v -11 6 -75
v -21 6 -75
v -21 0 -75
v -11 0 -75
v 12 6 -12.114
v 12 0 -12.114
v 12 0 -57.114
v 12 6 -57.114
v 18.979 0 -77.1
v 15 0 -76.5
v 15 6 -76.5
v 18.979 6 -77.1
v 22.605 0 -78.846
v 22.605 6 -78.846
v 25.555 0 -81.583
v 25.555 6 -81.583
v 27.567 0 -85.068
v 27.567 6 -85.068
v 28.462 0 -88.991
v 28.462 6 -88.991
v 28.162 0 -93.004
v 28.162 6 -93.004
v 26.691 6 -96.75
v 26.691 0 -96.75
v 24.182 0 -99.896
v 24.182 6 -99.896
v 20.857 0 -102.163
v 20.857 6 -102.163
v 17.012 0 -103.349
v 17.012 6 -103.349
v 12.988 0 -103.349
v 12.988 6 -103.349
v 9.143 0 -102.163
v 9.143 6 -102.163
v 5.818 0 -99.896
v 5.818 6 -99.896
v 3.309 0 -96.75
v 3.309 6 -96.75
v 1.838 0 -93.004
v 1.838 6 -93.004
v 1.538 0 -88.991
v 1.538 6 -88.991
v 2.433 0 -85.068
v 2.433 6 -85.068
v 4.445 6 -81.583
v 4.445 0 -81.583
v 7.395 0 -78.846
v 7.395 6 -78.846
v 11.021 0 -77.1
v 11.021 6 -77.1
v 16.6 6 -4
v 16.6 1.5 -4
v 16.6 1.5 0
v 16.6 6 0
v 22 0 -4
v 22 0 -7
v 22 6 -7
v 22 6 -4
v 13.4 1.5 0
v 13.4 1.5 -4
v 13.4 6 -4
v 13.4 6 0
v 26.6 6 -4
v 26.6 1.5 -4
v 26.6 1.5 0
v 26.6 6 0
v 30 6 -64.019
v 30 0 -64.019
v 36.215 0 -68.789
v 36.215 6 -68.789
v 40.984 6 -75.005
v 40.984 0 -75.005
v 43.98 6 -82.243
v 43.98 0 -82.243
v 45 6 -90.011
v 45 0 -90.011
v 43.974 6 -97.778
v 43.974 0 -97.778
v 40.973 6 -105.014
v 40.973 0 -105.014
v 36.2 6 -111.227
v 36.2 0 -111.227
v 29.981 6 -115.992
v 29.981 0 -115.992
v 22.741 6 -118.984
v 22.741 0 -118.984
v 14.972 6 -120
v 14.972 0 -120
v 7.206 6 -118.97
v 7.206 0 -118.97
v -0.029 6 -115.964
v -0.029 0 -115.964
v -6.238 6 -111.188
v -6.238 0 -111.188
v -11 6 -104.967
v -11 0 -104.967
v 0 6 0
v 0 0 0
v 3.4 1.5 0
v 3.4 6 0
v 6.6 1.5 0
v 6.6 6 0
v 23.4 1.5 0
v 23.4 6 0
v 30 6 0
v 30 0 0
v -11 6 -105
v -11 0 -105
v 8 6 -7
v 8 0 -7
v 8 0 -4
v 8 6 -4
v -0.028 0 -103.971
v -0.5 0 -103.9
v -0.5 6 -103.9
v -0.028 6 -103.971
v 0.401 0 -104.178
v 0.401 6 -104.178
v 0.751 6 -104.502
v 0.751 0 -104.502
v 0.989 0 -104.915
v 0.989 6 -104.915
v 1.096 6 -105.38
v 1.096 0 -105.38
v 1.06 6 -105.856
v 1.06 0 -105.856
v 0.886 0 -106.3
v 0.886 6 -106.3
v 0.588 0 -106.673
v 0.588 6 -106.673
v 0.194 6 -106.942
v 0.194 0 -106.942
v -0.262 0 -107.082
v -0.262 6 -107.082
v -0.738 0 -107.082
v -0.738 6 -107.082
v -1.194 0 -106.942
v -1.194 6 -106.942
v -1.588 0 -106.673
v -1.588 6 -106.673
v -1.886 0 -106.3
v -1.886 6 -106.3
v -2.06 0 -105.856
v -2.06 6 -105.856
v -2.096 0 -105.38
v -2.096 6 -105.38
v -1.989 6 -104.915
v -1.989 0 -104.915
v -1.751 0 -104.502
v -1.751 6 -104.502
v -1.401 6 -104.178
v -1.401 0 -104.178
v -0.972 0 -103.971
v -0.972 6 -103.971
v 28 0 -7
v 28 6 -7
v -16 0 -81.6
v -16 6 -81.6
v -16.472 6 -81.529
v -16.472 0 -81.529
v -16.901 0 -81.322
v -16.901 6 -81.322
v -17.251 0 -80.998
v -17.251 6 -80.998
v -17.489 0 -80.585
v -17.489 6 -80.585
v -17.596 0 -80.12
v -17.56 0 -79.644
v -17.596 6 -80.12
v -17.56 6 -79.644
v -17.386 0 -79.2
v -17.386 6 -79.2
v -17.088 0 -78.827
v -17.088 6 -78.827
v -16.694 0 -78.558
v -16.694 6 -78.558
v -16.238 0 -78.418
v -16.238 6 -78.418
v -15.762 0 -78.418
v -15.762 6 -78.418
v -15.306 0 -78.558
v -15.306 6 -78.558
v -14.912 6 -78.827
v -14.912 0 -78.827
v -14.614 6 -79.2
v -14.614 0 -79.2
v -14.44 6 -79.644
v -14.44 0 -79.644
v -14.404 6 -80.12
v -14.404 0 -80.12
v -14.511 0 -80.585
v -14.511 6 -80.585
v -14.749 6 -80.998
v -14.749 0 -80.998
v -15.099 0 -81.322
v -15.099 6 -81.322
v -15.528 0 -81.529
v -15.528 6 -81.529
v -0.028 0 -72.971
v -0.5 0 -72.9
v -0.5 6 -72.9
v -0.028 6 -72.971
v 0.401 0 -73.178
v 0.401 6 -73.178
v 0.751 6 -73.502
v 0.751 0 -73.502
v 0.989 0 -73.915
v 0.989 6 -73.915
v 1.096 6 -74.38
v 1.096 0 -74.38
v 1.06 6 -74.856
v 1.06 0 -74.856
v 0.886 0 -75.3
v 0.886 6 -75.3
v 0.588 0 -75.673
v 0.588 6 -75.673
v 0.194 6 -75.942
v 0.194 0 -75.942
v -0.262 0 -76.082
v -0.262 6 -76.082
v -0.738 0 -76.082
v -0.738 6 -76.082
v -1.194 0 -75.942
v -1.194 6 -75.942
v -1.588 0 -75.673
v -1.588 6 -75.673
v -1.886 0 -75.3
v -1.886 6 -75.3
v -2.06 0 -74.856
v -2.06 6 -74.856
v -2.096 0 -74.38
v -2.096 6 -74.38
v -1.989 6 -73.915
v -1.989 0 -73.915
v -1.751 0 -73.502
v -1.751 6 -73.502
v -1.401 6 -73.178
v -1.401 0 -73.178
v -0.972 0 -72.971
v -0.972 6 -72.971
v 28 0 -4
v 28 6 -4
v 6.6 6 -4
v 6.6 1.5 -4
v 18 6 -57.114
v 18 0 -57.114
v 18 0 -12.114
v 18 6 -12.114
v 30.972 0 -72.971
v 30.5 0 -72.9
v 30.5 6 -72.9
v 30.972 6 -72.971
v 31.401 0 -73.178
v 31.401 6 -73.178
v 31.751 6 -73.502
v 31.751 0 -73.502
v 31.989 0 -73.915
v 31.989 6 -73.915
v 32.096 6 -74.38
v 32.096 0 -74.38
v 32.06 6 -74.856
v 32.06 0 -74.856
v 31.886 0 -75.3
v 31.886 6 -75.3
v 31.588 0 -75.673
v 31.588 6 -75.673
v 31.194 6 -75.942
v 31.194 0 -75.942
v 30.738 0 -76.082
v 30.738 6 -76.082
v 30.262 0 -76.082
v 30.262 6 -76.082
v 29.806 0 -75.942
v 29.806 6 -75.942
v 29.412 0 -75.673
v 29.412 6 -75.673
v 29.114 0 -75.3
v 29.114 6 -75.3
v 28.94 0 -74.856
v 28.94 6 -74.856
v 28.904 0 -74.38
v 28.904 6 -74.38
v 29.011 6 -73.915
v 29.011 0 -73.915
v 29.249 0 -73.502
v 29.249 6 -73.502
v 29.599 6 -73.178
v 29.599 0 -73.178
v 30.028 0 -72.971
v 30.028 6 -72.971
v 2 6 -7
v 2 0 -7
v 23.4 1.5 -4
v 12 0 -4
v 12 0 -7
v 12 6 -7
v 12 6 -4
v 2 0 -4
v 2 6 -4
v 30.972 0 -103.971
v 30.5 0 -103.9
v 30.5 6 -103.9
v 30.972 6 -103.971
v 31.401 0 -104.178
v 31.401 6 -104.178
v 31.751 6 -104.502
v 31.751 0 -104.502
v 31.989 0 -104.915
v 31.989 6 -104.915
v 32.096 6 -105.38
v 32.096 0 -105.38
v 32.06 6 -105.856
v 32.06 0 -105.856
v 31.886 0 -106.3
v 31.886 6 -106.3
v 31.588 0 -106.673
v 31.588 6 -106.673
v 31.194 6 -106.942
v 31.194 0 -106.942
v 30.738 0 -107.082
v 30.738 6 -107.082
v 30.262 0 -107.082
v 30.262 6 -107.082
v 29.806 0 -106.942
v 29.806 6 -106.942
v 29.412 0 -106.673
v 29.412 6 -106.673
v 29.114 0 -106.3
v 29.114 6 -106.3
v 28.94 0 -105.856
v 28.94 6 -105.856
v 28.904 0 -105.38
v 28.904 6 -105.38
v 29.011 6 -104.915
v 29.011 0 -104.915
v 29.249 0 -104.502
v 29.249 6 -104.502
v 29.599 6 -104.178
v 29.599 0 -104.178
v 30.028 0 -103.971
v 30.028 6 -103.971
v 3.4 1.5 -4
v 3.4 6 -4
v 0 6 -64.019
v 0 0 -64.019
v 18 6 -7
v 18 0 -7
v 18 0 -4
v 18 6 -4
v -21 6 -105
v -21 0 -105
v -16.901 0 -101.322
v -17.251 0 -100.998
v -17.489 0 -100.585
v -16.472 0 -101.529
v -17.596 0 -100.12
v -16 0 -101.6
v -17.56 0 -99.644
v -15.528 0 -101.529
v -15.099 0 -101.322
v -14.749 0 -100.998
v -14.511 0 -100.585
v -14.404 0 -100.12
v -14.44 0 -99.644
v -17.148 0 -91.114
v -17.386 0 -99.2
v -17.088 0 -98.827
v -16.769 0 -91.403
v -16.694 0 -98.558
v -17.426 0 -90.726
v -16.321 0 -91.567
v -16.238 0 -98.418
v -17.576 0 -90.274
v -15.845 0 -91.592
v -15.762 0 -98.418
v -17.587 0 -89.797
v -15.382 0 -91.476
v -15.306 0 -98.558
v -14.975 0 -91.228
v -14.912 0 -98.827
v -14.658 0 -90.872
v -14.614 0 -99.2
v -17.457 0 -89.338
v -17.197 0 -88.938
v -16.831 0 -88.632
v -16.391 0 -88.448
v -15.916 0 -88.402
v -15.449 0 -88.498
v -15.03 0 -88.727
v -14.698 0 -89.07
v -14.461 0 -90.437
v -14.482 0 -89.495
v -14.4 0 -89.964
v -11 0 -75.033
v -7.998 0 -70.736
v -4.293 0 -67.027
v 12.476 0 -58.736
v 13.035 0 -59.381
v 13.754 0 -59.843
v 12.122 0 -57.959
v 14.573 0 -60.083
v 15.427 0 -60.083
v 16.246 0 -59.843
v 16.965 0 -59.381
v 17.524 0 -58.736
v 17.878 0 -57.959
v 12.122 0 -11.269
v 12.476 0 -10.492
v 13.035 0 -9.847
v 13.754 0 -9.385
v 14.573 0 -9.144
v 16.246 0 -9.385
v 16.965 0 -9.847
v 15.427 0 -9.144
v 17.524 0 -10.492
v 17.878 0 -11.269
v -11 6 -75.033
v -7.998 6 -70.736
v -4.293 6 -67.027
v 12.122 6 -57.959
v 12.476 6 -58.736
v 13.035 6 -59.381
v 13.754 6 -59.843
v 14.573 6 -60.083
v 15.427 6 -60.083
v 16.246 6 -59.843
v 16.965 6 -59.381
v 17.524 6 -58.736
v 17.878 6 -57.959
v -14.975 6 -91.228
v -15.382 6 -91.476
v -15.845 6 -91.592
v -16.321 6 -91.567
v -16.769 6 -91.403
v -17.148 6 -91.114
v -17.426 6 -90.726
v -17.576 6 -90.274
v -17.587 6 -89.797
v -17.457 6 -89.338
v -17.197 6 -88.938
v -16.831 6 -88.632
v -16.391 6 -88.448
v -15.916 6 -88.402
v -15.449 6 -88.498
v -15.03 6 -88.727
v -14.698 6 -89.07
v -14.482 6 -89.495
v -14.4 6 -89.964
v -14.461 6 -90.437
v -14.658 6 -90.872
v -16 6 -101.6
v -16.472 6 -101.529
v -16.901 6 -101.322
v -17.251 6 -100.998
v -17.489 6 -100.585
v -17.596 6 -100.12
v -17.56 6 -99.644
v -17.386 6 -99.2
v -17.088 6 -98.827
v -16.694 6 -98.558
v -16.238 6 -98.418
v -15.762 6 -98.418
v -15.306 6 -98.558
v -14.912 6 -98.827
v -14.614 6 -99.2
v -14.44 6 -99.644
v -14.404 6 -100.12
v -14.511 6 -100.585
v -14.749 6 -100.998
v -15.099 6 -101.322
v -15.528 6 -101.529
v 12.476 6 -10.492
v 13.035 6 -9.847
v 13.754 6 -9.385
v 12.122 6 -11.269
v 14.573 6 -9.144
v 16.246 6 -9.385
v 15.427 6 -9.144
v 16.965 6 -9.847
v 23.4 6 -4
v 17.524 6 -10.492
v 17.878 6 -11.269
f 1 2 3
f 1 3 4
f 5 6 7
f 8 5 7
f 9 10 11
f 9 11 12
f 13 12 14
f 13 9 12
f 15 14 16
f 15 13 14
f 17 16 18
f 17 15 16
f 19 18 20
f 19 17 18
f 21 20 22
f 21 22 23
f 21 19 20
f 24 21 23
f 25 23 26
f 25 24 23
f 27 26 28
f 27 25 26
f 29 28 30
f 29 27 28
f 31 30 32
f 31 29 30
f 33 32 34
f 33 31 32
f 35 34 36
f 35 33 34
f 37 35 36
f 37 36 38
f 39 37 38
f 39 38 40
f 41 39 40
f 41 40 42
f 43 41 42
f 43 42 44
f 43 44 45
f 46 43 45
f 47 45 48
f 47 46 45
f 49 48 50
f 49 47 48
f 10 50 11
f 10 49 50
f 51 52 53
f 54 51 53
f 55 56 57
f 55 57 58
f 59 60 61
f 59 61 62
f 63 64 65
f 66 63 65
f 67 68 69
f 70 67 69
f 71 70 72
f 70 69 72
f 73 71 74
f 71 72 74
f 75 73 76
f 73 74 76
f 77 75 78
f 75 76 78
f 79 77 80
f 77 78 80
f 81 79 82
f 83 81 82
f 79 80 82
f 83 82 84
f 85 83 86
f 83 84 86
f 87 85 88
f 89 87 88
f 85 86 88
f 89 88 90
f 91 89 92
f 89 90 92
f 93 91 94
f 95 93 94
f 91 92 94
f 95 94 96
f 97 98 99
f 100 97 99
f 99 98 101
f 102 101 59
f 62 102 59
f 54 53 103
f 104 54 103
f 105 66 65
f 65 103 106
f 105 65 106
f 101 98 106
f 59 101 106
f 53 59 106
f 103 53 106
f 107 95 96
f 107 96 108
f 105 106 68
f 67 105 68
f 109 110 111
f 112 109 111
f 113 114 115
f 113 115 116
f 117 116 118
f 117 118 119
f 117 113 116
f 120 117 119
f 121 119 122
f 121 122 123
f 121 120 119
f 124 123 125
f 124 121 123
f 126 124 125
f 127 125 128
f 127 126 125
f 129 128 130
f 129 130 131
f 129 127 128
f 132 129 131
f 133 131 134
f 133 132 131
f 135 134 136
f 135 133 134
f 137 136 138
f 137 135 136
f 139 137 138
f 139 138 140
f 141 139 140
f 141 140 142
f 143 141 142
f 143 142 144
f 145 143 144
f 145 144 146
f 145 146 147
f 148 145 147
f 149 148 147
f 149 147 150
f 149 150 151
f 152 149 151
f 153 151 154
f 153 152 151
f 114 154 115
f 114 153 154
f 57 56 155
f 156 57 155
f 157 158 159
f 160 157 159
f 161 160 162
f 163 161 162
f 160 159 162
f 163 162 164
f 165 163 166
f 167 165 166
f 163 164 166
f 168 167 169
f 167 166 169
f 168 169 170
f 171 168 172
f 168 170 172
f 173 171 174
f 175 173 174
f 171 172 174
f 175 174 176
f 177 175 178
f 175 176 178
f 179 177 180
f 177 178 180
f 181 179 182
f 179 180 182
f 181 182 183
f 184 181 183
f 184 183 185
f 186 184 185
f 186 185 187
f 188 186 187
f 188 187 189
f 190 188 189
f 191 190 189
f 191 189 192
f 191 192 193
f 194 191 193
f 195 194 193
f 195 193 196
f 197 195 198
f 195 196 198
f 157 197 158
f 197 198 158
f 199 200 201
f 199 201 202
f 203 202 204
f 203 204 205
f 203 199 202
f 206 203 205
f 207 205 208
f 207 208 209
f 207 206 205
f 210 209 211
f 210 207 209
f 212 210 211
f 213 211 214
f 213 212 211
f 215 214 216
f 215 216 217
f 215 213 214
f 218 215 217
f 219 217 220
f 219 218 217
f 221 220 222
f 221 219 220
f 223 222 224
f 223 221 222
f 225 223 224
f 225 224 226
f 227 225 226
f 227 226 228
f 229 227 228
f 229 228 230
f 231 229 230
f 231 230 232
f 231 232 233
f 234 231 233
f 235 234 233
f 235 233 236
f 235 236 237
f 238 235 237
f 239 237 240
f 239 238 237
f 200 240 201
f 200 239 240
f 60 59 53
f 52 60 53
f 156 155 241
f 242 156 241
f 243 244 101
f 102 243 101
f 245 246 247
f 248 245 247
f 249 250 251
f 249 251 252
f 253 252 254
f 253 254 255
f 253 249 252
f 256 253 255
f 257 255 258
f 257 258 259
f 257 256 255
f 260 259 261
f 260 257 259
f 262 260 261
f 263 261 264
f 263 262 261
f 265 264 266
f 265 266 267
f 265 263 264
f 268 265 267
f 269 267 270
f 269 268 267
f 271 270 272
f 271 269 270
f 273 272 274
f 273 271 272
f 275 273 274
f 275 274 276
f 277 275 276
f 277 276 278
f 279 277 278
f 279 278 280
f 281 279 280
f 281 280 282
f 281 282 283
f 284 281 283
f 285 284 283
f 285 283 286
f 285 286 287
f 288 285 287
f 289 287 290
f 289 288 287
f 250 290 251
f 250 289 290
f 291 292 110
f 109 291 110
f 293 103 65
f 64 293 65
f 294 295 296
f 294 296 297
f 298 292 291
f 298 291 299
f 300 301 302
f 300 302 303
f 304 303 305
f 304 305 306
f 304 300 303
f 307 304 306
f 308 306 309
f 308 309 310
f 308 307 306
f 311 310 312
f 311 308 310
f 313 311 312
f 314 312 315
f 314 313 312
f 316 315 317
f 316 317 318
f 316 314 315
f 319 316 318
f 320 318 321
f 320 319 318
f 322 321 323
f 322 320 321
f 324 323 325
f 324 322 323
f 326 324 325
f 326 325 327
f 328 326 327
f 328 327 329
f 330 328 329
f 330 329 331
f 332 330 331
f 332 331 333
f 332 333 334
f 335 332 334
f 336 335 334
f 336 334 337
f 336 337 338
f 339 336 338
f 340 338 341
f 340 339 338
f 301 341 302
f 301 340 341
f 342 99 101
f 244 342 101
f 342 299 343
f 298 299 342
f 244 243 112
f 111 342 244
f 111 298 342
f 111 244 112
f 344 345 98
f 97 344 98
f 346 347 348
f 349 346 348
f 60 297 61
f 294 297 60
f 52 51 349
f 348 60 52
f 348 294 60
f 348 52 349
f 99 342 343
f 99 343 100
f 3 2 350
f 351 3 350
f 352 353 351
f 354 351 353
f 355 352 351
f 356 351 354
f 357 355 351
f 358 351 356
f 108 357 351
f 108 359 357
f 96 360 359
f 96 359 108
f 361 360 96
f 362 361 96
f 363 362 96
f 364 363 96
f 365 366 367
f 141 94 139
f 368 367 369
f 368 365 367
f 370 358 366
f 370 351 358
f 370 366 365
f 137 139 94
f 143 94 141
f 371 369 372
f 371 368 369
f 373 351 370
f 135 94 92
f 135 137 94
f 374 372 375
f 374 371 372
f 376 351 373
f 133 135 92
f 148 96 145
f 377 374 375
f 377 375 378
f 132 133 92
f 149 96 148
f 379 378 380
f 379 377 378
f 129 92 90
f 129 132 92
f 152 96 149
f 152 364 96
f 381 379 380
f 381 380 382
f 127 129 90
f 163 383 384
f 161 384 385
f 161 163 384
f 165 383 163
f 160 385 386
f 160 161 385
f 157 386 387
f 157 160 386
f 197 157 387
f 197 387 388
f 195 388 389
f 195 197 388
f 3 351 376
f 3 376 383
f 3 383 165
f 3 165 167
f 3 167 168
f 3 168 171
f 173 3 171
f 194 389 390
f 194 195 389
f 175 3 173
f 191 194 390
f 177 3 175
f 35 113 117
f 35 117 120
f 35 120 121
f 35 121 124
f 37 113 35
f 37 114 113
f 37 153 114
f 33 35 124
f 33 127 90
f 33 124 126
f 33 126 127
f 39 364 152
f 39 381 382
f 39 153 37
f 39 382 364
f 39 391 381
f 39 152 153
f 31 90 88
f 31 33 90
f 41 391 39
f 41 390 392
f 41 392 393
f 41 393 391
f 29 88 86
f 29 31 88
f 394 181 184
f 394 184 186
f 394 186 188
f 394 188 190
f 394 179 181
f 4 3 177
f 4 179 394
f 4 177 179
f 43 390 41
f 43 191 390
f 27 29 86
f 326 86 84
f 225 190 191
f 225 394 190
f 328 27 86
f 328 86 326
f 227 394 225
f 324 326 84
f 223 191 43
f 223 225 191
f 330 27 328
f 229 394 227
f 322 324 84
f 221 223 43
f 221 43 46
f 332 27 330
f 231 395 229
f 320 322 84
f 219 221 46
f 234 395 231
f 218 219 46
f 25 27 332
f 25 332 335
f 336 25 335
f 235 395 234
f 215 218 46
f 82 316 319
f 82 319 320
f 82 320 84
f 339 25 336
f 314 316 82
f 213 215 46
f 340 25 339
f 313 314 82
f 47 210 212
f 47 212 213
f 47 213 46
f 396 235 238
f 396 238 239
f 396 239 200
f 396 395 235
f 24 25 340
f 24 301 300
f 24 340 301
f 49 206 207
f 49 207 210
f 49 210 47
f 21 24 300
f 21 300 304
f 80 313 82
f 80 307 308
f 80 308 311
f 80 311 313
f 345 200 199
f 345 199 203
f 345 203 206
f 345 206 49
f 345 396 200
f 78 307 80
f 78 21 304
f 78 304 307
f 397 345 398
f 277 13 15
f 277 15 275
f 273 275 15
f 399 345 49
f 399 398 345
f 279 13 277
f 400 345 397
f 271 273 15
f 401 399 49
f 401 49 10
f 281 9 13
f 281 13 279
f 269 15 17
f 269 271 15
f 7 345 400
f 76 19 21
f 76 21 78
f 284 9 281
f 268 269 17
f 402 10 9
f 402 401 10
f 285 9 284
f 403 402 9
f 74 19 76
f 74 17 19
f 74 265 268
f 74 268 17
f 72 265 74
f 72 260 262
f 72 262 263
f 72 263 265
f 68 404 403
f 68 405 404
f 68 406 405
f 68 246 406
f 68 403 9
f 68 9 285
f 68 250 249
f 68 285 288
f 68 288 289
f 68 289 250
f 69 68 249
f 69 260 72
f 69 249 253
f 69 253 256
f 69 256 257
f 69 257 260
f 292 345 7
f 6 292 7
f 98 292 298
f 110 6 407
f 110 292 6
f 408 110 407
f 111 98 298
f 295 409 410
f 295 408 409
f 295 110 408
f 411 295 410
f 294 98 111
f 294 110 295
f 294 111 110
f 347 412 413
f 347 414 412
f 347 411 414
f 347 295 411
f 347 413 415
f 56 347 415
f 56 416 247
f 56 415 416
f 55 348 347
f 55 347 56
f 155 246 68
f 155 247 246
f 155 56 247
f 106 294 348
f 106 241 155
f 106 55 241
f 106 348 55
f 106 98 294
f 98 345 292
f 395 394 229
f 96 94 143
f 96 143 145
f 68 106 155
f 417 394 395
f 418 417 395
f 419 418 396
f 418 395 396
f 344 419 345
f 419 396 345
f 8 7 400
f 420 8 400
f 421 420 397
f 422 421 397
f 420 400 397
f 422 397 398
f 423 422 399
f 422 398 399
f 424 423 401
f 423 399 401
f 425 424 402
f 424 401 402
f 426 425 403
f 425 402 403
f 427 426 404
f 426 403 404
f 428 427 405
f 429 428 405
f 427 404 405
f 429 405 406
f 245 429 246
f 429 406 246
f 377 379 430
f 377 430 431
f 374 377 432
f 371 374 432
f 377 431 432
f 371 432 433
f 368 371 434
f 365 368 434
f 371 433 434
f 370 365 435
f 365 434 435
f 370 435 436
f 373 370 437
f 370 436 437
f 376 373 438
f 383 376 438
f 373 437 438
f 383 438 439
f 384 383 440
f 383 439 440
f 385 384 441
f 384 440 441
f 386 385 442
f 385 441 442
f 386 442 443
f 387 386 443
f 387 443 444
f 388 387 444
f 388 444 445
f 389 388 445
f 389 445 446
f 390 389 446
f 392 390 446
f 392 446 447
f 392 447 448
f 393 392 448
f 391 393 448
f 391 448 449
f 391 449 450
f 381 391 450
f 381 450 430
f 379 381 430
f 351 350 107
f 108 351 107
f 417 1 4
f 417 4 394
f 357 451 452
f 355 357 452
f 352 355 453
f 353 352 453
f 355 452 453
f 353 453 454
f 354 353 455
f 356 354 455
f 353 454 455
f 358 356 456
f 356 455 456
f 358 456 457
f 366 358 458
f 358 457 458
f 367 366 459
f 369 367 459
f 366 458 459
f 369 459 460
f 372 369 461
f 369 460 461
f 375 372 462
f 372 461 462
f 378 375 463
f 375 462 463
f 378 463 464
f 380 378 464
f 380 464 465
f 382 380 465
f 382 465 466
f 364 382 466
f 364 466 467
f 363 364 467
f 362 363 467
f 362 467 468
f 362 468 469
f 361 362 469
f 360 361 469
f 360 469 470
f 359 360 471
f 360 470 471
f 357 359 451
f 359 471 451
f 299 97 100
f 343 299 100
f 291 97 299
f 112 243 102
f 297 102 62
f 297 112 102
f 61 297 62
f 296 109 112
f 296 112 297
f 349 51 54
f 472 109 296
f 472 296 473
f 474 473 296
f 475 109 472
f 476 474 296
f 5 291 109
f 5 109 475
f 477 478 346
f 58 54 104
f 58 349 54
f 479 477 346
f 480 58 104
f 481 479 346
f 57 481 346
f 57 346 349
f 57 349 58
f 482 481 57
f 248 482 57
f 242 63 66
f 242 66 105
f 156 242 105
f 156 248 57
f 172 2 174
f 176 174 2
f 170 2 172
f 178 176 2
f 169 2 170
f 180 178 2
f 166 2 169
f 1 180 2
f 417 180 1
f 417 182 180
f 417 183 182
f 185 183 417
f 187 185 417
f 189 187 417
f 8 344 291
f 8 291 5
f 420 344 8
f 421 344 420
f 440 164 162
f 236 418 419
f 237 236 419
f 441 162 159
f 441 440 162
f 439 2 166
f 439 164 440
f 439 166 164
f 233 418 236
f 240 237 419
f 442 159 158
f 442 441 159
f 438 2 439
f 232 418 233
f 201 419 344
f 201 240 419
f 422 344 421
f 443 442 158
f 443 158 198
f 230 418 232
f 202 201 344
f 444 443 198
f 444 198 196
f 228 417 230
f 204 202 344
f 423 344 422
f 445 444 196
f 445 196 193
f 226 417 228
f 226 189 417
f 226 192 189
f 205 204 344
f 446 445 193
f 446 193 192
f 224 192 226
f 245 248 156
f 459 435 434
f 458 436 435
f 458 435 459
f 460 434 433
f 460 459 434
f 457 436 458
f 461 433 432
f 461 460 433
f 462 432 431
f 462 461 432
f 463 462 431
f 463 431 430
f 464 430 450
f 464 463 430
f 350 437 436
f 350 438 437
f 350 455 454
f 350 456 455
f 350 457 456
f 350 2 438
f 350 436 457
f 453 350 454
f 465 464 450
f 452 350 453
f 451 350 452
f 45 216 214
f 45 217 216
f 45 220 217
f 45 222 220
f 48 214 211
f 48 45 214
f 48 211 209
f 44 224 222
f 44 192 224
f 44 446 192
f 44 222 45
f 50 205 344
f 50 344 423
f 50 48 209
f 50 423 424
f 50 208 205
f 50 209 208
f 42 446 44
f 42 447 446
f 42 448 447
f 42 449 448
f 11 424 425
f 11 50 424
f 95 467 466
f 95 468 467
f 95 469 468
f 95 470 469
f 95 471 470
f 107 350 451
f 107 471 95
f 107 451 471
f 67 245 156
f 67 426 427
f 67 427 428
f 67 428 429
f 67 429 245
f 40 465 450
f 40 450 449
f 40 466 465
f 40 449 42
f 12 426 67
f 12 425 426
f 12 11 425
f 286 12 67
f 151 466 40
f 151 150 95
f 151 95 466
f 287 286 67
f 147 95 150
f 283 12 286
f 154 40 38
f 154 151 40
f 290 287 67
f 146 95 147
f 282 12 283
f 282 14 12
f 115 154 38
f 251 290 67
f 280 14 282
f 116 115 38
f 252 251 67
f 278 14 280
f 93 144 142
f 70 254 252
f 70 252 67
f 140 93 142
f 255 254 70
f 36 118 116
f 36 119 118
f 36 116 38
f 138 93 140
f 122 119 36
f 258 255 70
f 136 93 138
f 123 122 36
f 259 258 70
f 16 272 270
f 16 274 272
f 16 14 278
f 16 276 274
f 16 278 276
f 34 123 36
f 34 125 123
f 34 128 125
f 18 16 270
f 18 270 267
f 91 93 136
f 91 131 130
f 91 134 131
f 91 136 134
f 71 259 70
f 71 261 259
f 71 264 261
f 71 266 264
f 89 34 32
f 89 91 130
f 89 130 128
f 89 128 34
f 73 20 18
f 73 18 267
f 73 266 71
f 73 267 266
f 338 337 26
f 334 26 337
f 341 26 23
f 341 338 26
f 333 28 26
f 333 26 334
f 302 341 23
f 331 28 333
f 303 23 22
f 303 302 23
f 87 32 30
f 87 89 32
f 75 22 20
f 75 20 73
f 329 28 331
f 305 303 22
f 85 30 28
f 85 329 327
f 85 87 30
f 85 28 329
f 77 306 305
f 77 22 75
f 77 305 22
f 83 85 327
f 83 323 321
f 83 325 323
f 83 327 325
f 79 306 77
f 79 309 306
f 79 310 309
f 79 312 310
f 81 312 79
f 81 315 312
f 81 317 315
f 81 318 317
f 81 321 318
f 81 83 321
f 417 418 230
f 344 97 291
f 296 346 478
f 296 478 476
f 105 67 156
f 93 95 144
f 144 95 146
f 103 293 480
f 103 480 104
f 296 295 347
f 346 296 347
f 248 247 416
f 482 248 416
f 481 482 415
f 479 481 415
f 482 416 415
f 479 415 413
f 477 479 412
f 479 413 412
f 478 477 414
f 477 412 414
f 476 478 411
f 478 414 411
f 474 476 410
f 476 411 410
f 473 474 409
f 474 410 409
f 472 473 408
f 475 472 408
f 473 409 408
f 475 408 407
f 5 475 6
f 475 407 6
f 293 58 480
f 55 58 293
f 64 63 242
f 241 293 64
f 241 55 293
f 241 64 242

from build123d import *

# Parameters (mm, degrees)
SKETCH_1_R          = 1.6
SKETCH_1_R_2        = 13.5
EXTRUDE_1_DEPTH     = 6
SKETCH_3_W          = 10
SKETCH_3_H          = 30
SKETCH_3_R          = 1.6
EXTRUDE_2_DEPTH     = 6
SKETCH_7_W          = 3.2
SKETCH_7_H          = 4
CUT_EXTRUDE_3_DEPTH = 14.5
SKETCH_8_W          = 6
SKETCH_8_H          = 3
CUT_EXTRUDE_4_DEPTH = 14.5
SKETCH_10_W         = 23.31764578
SKETCH_10_H         = 4
EXTRUDE_3_DEPTH     = 1.5
SKETCH_11_R         = 1.6
CUT_EXTRUDE_5_DEPTH = 10


with BuildPart() as part:
    # 草图1 → 凸台-拉伸1 (new body)
    with BuildSketch(Plane(origin=(0, 0, 0), x_dir=(1, 0, 0), z_dir=(0, 1, 0))):
        with BuildLine():
            Line((0, 64.019237886), (0, 0))
            Line((0, 0), (30, 0))
            Line((30, 0), (30, 64.019237886))
            ThreePointArc((30, 64.019237886), (15, 120), (0, 64.019237886))
        make_face()
        with BuildLine():
            ThreePointArc((12, 57.113903717), (15, 60.113903717), (18, 57.113903717))
            Line((18, 57.113903717), (18, 12.113903717))
            ThreePointArc((18, 12.113903717), (15, 9.113903717), (12, 12.113903717))
            Line((12, 12.113903717), (12, 57.113903717))
        make_face(mode=Mode.SUBTRACT)
        with Locations(Location((-0.5, 74.5, 0), (0, 0, 270))):
            Circle(SKETCH_1_R, mode=Mode.SUBTRACT)
        with Locations(Location((15, 90, 0), (0, 0, 270))):
            Circle(SKETCH_1_R_2, mode=Mode.SUBTRACT)
        with Locations(Location((30.5, 74.5, 0), (0, 0, 270))):
            Circle(SKETCH_1_R, mode=Mode.SUBTRACT)
        with Locations(Location((30.5, 105.5, 0), (0, 0, 270))):
            Circle(SKETCH_1_R, mode=Mode.SUBTRACT)
        with Locations(Location((-0.5, 105.5, 0), (0, 0, 270))):
            Circle(SKETCH_1_R, mode=Mode.SUBTRACT)
    extrude(amount=EXTRUDE_1_DEPTH)

    # 草图3 → 凸台-拉伸2 (add)
    with BuildSketch(Plane(origin=(0, 6, 0), x_dir=(1, 0, 0), z_dir=(0, 1, 0))):
        with Locations((-16, 90)):
            Rectangle(SKETCH_3_W, SKETCH_3_H)
        with Locations(Location((-16, 80, 0), (0, 0, 90))):
            Circle(SKETCH_3_R, mode=Mode.SUBTRACT)
        with Locations((-16, 90)):
            Circle(SKETCH_3_R, mode=Mode.SUBTRACT)
        with Locations(Location((-16, 100, 0), (0, 0, 90))):
            Circle(SKETCH_3_R, mode=Mode.SUBTRACT)
    extrude(amount=-EXTRUDE_2_DEPTH)

    # 草图7 → 切除-拉伸3 (cut)
    with BuildSketch(Plane.XZ):
        with Locations((25, -2)):
            Rectangle(SKETCH_7_W, SKETCH_7_H)
        with Locations((15, -2)):
            Rectangle(SKETCH_7_W, SKETCH_7_H)
        with Locations((5, -2)):
            Rectangle(SKETCH_7_W, SKETCH_7_H)
    extrude(amount=-CUT_EXTRUDE_3_DEPTH, mode=Mode.SUBTRACT)

    # 草图8 → 切除-拉伸4 (cut)
    with BuildSketch(Plane.XZ):
        with Locations((5, -5.5)):
            Rectangle(SKETCH_8_W, SKETCH_8_H)
        with Locations((15, -5.5)):
            Rectangle(SKETCH_8_W, SKETCH_8_H)
        with Locations((25, -5.5)):
            Rectangle(SKETCH_8_W, SKETCH_8_H)
    extrude(amount=-CUT_EXTRUDE_4_DEPTH, mode=Mode.SUBTRACT)

    # 草图10 → 凸台-拉伸3 (add)
    with BuildSketch(Plane.XZ):
        with Locations((15.05882289, -2)):
            Rectangle(SKETCH_10_W, SKETCH_10_H)
    extrude(amount=-EXTRUDE_3_DEPTH)

    # 草图11 → 切除-拉伸5 (cut)
    with BuildSketch(Plane(origin=(0, 6, 0), x_dir=(1, 0, 0), z_dir=(0, 1, 0))):
        with Locations(Location((-16, 90, 0), (0, 0, 90))):
            Circle(SKETCH_11_R)
    extrude(amount=-CUT_EXTRUDE_5_DEPTH, mode=Mode.SUBTRACT)


solid = part.part
